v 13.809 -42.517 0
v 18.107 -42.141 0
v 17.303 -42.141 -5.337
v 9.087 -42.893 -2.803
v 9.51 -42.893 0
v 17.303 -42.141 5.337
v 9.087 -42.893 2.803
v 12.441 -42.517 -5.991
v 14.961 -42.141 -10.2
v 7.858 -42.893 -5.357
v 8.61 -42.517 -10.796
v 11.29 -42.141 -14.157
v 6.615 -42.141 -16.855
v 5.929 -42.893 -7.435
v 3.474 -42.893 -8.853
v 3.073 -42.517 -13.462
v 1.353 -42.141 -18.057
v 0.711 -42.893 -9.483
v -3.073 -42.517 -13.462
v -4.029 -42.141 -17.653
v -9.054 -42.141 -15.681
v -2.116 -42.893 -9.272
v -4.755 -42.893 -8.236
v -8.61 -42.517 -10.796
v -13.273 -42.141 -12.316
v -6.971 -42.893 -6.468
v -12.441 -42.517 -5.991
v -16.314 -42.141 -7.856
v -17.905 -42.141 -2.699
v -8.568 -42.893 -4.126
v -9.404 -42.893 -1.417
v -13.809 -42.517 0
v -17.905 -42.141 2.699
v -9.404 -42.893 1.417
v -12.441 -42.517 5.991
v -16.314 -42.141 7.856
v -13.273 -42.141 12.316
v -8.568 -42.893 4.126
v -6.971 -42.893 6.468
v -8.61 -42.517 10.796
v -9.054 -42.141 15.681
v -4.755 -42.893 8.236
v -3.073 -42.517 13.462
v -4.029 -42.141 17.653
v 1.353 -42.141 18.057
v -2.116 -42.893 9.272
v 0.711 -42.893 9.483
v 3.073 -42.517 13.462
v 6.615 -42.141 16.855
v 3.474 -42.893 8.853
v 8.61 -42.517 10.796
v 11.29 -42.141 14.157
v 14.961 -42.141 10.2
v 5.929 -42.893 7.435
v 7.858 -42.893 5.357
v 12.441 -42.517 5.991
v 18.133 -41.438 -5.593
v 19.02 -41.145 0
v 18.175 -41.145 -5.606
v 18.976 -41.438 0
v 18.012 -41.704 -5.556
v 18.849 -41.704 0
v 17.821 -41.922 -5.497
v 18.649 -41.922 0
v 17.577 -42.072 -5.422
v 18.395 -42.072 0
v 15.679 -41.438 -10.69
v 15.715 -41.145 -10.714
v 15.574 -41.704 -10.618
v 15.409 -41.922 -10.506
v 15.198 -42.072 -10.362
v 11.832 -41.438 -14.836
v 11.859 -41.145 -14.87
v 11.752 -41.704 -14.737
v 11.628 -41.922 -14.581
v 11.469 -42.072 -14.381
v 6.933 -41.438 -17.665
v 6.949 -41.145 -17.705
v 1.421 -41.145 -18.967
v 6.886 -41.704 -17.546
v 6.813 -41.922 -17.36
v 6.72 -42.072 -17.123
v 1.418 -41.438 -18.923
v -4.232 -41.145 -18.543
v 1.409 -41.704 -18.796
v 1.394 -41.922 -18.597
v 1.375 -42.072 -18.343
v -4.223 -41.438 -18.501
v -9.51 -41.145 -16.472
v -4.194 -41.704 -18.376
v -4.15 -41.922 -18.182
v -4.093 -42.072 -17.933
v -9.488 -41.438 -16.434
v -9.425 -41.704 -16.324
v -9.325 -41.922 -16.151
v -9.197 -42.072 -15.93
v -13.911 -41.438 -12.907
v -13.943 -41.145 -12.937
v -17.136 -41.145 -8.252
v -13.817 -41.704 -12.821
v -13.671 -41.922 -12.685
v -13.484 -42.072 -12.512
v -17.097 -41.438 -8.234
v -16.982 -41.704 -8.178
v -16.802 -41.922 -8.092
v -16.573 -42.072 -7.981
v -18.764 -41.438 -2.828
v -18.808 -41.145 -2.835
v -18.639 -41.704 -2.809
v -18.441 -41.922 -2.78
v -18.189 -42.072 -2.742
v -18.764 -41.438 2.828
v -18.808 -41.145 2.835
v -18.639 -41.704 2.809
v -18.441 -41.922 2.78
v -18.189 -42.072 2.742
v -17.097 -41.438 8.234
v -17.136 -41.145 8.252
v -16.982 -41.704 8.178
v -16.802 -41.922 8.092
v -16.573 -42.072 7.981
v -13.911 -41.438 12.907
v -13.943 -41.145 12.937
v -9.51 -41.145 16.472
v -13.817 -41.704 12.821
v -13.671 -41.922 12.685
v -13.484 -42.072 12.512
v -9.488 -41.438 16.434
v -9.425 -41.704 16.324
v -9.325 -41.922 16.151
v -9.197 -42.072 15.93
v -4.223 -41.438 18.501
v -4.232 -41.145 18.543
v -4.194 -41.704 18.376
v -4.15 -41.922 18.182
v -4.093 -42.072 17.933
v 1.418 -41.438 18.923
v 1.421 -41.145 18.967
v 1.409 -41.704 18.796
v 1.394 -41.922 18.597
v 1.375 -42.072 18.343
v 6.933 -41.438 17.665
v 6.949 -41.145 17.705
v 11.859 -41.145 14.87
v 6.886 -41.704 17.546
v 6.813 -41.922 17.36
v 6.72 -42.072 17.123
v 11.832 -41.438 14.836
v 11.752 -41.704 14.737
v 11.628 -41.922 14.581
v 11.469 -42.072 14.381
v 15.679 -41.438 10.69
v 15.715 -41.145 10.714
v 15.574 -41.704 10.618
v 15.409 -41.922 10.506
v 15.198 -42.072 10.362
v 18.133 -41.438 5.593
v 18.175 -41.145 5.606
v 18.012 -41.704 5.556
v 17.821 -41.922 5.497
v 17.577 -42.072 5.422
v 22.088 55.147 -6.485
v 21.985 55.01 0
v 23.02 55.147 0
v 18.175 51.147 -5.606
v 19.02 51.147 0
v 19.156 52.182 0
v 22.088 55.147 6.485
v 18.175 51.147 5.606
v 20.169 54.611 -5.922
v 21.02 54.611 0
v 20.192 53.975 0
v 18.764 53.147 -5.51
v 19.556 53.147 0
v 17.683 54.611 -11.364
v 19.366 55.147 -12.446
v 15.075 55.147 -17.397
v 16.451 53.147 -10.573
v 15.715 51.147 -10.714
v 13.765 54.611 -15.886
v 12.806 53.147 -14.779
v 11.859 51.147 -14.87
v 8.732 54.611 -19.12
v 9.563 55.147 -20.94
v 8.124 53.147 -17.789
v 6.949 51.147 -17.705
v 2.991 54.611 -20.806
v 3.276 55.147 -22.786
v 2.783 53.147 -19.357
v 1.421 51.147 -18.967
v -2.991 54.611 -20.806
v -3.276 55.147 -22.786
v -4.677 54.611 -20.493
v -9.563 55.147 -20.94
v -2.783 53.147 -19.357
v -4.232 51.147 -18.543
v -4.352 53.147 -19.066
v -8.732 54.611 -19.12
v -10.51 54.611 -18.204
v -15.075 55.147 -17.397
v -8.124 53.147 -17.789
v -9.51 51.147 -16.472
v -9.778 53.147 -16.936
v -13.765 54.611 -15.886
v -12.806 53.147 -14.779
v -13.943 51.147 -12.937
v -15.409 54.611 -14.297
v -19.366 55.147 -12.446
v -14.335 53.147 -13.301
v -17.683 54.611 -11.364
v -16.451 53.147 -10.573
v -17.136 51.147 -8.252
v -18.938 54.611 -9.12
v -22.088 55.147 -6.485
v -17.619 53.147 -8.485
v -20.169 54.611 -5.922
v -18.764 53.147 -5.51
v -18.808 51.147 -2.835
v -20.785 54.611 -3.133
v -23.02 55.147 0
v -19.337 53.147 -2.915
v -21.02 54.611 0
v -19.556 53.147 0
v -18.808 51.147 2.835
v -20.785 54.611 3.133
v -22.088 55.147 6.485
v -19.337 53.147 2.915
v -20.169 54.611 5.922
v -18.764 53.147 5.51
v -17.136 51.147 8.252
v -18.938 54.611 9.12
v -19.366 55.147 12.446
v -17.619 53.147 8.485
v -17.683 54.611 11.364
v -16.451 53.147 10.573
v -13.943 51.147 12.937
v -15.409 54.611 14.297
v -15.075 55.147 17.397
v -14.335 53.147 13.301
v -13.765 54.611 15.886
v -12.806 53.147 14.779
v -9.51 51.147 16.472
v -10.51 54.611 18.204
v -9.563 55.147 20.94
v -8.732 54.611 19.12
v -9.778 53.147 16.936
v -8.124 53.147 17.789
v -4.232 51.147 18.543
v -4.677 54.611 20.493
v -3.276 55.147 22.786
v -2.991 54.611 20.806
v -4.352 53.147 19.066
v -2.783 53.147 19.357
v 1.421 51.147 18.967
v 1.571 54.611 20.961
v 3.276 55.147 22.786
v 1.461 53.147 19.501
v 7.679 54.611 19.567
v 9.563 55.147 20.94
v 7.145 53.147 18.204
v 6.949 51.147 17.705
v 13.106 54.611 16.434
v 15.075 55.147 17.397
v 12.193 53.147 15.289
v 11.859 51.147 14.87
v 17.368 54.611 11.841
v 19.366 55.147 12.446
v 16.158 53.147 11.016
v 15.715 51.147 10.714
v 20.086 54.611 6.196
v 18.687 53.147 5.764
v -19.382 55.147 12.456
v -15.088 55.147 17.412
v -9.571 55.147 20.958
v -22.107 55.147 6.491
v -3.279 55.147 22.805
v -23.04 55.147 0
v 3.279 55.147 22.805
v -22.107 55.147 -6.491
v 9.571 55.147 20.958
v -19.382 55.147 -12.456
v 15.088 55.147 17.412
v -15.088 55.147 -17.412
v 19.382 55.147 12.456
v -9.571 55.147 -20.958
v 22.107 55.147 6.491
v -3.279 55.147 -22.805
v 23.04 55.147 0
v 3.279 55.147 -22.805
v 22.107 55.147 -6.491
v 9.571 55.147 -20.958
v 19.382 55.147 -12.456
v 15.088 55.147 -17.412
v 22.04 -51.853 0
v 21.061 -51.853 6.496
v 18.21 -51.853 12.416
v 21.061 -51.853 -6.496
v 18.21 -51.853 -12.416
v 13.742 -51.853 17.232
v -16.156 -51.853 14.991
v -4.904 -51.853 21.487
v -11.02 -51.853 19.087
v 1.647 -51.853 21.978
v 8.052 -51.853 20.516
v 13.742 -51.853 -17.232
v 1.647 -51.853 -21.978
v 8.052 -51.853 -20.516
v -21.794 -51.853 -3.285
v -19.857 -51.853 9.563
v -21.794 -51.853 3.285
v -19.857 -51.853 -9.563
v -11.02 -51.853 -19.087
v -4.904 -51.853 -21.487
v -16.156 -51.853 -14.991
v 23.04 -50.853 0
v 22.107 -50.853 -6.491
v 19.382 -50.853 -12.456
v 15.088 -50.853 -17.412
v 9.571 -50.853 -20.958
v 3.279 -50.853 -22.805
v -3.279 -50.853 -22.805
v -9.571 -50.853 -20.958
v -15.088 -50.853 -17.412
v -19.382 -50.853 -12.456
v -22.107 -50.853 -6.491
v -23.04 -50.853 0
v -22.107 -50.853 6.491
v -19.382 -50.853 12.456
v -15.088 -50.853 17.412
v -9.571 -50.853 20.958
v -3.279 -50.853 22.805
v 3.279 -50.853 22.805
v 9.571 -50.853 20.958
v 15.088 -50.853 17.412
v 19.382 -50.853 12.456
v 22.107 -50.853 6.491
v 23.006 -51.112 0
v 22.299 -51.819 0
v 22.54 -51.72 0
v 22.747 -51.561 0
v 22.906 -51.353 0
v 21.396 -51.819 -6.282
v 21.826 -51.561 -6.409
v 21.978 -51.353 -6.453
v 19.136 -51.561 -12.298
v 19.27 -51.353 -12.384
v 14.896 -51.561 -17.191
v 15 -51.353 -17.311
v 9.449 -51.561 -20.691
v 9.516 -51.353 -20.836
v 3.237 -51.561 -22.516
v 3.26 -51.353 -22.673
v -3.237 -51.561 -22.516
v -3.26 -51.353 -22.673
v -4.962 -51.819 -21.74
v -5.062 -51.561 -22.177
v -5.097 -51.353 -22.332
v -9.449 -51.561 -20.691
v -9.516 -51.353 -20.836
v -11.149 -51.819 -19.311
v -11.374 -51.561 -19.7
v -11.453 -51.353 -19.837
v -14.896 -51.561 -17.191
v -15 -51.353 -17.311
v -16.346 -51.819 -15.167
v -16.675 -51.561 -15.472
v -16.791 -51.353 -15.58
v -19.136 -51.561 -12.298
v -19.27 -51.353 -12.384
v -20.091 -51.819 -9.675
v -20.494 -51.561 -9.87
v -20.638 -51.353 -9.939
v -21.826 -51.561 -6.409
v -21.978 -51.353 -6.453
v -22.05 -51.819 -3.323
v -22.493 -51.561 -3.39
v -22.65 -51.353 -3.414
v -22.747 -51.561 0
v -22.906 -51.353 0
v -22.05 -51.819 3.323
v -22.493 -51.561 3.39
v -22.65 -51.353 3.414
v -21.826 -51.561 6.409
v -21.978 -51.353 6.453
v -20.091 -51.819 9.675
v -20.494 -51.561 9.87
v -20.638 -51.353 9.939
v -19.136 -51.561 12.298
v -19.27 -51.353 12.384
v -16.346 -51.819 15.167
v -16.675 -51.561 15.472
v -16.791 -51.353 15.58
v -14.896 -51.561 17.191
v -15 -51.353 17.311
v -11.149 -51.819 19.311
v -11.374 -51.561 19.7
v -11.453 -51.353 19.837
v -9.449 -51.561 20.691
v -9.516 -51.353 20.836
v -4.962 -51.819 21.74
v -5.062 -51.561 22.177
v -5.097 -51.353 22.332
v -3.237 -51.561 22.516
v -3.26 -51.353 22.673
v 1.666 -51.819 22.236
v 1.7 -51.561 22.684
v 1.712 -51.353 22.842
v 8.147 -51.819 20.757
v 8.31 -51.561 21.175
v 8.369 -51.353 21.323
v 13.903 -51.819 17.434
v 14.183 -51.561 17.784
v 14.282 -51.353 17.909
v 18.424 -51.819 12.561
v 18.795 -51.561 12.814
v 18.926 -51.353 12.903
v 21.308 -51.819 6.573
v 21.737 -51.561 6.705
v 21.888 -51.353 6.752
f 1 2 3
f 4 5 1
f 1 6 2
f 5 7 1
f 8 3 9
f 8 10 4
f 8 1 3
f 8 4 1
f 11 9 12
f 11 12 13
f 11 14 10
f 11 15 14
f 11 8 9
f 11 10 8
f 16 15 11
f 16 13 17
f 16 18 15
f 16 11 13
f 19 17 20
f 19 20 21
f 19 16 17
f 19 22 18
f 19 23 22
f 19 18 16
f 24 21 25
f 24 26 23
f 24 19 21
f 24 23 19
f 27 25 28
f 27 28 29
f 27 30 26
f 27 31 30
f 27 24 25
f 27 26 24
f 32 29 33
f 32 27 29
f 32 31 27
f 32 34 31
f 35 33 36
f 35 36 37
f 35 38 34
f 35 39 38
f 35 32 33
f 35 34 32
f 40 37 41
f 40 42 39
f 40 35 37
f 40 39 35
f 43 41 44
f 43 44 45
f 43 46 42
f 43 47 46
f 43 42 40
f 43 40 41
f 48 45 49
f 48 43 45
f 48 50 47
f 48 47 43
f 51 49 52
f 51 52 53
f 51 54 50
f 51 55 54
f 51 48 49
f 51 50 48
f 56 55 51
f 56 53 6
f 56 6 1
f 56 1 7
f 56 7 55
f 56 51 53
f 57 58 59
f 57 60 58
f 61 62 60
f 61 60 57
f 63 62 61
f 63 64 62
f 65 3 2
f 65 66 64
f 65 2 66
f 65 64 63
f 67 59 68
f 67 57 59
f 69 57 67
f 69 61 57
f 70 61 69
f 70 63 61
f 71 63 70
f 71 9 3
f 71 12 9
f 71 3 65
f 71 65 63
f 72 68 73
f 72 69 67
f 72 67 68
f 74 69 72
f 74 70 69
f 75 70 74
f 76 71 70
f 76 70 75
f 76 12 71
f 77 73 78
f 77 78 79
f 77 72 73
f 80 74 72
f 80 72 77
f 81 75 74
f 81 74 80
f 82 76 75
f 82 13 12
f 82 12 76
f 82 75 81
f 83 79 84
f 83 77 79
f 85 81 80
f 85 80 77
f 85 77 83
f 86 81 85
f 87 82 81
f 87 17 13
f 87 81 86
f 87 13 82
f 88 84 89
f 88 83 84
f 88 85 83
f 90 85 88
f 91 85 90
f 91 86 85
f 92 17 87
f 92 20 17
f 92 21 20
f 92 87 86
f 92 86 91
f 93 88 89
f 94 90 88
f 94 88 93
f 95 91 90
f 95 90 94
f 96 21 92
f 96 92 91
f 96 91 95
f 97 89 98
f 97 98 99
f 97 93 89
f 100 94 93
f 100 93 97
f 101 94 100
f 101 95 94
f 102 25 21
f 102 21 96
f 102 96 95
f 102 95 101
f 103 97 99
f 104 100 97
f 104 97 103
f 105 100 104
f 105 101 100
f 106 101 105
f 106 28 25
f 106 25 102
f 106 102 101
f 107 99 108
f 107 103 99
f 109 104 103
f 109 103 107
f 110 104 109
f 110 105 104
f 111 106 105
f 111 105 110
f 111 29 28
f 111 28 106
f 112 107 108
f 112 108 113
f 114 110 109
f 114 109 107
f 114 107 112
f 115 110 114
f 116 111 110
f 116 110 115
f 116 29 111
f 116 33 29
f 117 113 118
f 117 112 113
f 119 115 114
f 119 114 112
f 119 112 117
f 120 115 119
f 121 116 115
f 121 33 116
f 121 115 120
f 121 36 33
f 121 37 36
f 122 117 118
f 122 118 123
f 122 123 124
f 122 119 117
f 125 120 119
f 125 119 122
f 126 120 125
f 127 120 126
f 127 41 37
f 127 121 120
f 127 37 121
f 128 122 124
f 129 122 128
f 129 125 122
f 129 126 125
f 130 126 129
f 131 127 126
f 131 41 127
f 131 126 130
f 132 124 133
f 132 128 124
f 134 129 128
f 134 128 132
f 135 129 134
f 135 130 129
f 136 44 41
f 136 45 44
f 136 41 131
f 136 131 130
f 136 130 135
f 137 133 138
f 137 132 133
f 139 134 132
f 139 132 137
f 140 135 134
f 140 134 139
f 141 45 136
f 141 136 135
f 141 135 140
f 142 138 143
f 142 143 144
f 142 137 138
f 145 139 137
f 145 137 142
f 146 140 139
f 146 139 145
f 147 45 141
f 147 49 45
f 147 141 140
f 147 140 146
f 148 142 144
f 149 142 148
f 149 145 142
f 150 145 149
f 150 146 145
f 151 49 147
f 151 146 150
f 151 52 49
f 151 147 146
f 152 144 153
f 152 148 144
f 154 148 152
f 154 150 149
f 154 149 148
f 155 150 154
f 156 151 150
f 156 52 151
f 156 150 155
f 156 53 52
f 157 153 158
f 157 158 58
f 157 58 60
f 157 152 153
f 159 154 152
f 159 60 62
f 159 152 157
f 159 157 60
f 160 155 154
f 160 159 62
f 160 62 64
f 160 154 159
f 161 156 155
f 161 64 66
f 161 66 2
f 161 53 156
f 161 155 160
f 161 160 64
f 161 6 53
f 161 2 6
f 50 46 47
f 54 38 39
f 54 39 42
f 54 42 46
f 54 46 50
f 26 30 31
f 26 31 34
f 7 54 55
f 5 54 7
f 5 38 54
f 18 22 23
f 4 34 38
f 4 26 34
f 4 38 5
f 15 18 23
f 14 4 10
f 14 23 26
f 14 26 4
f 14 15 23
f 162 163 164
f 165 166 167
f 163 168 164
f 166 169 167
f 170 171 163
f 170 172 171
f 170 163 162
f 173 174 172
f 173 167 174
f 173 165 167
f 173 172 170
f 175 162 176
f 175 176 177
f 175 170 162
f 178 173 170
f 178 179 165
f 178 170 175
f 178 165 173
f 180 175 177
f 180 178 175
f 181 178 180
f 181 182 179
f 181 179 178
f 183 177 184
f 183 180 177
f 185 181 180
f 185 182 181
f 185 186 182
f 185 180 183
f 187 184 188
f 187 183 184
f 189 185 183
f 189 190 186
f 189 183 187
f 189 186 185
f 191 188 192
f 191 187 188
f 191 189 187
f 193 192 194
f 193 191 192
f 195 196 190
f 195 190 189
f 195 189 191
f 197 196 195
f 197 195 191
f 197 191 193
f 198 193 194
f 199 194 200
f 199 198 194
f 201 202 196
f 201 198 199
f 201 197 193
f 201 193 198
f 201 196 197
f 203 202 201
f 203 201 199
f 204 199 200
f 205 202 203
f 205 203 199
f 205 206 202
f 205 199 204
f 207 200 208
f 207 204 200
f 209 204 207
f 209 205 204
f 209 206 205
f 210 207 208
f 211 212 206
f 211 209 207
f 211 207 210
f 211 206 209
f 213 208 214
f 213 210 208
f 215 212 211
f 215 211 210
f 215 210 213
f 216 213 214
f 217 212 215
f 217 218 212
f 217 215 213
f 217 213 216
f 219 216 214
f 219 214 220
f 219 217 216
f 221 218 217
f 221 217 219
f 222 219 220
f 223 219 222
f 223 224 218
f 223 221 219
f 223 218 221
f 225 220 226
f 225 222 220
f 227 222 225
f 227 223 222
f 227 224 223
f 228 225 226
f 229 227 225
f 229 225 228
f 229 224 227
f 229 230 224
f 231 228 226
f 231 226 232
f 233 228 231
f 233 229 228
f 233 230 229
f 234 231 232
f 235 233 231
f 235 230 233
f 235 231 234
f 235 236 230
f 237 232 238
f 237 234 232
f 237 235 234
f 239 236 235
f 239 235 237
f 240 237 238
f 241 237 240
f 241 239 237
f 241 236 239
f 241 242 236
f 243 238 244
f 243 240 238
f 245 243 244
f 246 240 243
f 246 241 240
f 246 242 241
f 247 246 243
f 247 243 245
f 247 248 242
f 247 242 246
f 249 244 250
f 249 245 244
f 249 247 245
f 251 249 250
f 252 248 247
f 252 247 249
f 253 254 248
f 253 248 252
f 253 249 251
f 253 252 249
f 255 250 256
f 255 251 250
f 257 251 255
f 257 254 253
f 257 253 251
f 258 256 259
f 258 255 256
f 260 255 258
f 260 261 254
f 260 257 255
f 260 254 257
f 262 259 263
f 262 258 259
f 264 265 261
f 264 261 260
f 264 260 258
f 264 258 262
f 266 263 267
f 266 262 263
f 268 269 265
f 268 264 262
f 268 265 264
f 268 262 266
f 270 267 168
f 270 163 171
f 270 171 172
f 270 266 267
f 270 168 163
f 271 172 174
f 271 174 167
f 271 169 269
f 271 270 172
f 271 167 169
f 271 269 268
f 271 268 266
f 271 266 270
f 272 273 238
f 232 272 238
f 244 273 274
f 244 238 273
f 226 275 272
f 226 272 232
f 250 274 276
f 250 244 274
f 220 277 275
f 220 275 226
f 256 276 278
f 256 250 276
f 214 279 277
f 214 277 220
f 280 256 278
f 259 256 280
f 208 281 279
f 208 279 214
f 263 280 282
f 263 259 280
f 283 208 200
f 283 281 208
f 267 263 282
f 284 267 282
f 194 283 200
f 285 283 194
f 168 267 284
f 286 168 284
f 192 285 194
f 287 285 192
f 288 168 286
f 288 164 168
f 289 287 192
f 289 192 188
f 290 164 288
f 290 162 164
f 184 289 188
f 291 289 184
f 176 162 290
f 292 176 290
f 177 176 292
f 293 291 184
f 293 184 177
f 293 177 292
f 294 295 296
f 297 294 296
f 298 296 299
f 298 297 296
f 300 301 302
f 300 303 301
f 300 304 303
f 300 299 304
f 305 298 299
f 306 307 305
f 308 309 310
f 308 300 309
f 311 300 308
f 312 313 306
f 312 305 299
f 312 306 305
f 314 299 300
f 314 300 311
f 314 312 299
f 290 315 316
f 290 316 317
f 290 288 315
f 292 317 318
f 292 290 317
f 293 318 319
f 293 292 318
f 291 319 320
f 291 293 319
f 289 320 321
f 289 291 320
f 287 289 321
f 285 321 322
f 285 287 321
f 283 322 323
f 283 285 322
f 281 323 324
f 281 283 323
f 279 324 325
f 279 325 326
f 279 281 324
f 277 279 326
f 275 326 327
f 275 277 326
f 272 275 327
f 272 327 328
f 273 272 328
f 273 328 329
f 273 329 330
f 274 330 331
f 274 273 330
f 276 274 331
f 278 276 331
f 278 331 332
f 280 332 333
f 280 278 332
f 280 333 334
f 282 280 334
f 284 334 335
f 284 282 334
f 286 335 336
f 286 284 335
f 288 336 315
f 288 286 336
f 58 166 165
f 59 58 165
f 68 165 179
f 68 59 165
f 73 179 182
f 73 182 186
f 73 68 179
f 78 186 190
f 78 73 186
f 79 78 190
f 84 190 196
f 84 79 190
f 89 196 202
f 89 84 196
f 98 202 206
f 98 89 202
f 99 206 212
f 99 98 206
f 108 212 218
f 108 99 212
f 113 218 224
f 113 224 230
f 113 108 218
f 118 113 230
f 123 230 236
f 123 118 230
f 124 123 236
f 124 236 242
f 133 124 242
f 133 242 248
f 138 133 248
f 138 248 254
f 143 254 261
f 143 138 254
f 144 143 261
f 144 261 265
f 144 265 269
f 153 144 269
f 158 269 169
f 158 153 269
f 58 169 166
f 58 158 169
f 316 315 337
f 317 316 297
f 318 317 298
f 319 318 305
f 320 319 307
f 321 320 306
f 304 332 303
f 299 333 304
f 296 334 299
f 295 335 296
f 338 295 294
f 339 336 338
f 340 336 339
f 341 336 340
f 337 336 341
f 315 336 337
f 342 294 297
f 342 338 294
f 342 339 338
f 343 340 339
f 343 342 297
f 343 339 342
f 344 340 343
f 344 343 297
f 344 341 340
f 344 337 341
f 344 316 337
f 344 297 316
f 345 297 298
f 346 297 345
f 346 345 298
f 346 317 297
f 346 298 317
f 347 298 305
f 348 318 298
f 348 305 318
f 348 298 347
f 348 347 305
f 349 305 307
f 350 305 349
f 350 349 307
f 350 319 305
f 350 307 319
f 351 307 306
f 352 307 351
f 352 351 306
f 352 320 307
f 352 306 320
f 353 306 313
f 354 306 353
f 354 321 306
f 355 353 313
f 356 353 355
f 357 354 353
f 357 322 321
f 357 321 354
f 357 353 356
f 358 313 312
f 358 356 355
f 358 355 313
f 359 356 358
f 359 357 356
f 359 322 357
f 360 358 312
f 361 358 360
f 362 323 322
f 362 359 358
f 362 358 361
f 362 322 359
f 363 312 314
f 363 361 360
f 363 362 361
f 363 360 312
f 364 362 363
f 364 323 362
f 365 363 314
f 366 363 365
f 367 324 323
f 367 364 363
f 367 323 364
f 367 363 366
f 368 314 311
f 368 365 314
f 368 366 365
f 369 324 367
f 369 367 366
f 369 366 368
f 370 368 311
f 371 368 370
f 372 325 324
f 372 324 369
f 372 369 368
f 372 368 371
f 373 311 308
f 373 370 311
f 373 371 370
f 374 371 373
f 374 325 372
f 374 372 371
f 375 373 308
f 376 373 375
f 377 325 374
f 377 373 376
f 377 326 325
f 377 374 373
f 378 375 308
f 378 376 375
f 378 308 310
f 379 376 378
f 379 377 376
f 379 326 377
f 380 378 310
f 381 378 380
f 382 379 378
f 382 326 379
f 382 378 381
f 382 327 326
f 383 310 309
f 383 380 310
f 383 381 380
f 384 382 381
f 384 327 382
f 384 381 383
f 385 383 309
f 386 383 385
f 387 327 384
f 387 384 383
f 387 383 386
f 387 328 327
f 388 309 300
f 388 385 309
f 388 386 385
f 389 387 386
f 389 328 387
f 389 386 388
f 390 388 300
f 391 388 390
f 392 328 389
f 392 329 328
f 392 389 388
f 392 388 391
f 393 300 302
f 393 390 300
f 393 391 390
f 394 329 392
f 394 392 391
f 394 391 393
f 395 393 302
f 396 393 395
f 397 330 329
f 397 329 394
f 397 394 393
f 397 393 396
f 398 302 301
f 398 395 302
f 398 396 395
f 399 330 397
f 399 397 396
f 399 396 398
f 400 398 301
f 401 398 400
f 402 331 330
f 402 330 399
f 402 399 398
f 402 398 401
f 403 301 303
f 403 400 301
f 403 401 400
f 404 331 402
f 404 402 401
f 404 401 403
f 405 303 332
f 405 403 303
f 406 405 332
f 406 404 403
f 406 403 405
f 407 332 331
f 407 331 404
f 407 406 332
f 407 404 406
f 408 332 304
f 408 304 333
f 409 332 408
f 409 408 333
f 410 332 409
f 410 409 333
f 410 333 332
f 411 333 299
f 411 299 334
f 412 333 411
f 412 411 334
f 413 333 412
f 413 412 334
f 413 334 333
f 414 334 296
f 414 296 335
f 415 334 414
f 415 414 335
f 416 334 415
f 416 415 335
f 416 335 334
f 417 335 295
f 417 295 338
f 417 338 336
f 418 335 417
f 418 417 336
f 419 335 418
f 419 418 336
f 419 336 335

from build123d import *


with BuildPart() as part:
    # Szkic1 → Obrót1 (revolve)
    with BuildSketch(Plane.XY, mode=Mode.PRIVATE) as obr_t1_sk:
        with BuildLine():
            Line((-23.04, -50.853493976), (-23.04, 55.146506024))
            Line((-23.04, 55.146506024), (-23.02, 55.146506024))
            ThreePointArc((-23.02, 55.146506024), (-20.191572875, 53.974933149), (-19.02, 51.146506024))
            Line((-19.02, 51.146506024), (-19.02, -41.145145612))
            ThreePointArc((-19.02, -41.145145612), (-18.757277337, -41.820735819), (-18.107155743, -42.14134031))
            Line((-18.107155743, -42.14134031), (-9.51, -42.893493976))
            Line((-9.51, -42.893493976), (0, -42.893493976))
            Line((0, -42.893493976), (0, -51.853493976))
            Line((0, -51.853493976), (-22.04, -51.853493976))
            ThreePointArc((-22.04, -51.853493976), (-22.747106781, -51.560600757), (-23.04, -50.853493976))
        make_face()
    revolve(obr_t1_sk.sketch.rotate(Axis((0, -51.853493976, 0), (0, 1, 0)), 180), axis=Axis((0, -51.853493976, 0), (0, 1, 0)))


solid = part.part
